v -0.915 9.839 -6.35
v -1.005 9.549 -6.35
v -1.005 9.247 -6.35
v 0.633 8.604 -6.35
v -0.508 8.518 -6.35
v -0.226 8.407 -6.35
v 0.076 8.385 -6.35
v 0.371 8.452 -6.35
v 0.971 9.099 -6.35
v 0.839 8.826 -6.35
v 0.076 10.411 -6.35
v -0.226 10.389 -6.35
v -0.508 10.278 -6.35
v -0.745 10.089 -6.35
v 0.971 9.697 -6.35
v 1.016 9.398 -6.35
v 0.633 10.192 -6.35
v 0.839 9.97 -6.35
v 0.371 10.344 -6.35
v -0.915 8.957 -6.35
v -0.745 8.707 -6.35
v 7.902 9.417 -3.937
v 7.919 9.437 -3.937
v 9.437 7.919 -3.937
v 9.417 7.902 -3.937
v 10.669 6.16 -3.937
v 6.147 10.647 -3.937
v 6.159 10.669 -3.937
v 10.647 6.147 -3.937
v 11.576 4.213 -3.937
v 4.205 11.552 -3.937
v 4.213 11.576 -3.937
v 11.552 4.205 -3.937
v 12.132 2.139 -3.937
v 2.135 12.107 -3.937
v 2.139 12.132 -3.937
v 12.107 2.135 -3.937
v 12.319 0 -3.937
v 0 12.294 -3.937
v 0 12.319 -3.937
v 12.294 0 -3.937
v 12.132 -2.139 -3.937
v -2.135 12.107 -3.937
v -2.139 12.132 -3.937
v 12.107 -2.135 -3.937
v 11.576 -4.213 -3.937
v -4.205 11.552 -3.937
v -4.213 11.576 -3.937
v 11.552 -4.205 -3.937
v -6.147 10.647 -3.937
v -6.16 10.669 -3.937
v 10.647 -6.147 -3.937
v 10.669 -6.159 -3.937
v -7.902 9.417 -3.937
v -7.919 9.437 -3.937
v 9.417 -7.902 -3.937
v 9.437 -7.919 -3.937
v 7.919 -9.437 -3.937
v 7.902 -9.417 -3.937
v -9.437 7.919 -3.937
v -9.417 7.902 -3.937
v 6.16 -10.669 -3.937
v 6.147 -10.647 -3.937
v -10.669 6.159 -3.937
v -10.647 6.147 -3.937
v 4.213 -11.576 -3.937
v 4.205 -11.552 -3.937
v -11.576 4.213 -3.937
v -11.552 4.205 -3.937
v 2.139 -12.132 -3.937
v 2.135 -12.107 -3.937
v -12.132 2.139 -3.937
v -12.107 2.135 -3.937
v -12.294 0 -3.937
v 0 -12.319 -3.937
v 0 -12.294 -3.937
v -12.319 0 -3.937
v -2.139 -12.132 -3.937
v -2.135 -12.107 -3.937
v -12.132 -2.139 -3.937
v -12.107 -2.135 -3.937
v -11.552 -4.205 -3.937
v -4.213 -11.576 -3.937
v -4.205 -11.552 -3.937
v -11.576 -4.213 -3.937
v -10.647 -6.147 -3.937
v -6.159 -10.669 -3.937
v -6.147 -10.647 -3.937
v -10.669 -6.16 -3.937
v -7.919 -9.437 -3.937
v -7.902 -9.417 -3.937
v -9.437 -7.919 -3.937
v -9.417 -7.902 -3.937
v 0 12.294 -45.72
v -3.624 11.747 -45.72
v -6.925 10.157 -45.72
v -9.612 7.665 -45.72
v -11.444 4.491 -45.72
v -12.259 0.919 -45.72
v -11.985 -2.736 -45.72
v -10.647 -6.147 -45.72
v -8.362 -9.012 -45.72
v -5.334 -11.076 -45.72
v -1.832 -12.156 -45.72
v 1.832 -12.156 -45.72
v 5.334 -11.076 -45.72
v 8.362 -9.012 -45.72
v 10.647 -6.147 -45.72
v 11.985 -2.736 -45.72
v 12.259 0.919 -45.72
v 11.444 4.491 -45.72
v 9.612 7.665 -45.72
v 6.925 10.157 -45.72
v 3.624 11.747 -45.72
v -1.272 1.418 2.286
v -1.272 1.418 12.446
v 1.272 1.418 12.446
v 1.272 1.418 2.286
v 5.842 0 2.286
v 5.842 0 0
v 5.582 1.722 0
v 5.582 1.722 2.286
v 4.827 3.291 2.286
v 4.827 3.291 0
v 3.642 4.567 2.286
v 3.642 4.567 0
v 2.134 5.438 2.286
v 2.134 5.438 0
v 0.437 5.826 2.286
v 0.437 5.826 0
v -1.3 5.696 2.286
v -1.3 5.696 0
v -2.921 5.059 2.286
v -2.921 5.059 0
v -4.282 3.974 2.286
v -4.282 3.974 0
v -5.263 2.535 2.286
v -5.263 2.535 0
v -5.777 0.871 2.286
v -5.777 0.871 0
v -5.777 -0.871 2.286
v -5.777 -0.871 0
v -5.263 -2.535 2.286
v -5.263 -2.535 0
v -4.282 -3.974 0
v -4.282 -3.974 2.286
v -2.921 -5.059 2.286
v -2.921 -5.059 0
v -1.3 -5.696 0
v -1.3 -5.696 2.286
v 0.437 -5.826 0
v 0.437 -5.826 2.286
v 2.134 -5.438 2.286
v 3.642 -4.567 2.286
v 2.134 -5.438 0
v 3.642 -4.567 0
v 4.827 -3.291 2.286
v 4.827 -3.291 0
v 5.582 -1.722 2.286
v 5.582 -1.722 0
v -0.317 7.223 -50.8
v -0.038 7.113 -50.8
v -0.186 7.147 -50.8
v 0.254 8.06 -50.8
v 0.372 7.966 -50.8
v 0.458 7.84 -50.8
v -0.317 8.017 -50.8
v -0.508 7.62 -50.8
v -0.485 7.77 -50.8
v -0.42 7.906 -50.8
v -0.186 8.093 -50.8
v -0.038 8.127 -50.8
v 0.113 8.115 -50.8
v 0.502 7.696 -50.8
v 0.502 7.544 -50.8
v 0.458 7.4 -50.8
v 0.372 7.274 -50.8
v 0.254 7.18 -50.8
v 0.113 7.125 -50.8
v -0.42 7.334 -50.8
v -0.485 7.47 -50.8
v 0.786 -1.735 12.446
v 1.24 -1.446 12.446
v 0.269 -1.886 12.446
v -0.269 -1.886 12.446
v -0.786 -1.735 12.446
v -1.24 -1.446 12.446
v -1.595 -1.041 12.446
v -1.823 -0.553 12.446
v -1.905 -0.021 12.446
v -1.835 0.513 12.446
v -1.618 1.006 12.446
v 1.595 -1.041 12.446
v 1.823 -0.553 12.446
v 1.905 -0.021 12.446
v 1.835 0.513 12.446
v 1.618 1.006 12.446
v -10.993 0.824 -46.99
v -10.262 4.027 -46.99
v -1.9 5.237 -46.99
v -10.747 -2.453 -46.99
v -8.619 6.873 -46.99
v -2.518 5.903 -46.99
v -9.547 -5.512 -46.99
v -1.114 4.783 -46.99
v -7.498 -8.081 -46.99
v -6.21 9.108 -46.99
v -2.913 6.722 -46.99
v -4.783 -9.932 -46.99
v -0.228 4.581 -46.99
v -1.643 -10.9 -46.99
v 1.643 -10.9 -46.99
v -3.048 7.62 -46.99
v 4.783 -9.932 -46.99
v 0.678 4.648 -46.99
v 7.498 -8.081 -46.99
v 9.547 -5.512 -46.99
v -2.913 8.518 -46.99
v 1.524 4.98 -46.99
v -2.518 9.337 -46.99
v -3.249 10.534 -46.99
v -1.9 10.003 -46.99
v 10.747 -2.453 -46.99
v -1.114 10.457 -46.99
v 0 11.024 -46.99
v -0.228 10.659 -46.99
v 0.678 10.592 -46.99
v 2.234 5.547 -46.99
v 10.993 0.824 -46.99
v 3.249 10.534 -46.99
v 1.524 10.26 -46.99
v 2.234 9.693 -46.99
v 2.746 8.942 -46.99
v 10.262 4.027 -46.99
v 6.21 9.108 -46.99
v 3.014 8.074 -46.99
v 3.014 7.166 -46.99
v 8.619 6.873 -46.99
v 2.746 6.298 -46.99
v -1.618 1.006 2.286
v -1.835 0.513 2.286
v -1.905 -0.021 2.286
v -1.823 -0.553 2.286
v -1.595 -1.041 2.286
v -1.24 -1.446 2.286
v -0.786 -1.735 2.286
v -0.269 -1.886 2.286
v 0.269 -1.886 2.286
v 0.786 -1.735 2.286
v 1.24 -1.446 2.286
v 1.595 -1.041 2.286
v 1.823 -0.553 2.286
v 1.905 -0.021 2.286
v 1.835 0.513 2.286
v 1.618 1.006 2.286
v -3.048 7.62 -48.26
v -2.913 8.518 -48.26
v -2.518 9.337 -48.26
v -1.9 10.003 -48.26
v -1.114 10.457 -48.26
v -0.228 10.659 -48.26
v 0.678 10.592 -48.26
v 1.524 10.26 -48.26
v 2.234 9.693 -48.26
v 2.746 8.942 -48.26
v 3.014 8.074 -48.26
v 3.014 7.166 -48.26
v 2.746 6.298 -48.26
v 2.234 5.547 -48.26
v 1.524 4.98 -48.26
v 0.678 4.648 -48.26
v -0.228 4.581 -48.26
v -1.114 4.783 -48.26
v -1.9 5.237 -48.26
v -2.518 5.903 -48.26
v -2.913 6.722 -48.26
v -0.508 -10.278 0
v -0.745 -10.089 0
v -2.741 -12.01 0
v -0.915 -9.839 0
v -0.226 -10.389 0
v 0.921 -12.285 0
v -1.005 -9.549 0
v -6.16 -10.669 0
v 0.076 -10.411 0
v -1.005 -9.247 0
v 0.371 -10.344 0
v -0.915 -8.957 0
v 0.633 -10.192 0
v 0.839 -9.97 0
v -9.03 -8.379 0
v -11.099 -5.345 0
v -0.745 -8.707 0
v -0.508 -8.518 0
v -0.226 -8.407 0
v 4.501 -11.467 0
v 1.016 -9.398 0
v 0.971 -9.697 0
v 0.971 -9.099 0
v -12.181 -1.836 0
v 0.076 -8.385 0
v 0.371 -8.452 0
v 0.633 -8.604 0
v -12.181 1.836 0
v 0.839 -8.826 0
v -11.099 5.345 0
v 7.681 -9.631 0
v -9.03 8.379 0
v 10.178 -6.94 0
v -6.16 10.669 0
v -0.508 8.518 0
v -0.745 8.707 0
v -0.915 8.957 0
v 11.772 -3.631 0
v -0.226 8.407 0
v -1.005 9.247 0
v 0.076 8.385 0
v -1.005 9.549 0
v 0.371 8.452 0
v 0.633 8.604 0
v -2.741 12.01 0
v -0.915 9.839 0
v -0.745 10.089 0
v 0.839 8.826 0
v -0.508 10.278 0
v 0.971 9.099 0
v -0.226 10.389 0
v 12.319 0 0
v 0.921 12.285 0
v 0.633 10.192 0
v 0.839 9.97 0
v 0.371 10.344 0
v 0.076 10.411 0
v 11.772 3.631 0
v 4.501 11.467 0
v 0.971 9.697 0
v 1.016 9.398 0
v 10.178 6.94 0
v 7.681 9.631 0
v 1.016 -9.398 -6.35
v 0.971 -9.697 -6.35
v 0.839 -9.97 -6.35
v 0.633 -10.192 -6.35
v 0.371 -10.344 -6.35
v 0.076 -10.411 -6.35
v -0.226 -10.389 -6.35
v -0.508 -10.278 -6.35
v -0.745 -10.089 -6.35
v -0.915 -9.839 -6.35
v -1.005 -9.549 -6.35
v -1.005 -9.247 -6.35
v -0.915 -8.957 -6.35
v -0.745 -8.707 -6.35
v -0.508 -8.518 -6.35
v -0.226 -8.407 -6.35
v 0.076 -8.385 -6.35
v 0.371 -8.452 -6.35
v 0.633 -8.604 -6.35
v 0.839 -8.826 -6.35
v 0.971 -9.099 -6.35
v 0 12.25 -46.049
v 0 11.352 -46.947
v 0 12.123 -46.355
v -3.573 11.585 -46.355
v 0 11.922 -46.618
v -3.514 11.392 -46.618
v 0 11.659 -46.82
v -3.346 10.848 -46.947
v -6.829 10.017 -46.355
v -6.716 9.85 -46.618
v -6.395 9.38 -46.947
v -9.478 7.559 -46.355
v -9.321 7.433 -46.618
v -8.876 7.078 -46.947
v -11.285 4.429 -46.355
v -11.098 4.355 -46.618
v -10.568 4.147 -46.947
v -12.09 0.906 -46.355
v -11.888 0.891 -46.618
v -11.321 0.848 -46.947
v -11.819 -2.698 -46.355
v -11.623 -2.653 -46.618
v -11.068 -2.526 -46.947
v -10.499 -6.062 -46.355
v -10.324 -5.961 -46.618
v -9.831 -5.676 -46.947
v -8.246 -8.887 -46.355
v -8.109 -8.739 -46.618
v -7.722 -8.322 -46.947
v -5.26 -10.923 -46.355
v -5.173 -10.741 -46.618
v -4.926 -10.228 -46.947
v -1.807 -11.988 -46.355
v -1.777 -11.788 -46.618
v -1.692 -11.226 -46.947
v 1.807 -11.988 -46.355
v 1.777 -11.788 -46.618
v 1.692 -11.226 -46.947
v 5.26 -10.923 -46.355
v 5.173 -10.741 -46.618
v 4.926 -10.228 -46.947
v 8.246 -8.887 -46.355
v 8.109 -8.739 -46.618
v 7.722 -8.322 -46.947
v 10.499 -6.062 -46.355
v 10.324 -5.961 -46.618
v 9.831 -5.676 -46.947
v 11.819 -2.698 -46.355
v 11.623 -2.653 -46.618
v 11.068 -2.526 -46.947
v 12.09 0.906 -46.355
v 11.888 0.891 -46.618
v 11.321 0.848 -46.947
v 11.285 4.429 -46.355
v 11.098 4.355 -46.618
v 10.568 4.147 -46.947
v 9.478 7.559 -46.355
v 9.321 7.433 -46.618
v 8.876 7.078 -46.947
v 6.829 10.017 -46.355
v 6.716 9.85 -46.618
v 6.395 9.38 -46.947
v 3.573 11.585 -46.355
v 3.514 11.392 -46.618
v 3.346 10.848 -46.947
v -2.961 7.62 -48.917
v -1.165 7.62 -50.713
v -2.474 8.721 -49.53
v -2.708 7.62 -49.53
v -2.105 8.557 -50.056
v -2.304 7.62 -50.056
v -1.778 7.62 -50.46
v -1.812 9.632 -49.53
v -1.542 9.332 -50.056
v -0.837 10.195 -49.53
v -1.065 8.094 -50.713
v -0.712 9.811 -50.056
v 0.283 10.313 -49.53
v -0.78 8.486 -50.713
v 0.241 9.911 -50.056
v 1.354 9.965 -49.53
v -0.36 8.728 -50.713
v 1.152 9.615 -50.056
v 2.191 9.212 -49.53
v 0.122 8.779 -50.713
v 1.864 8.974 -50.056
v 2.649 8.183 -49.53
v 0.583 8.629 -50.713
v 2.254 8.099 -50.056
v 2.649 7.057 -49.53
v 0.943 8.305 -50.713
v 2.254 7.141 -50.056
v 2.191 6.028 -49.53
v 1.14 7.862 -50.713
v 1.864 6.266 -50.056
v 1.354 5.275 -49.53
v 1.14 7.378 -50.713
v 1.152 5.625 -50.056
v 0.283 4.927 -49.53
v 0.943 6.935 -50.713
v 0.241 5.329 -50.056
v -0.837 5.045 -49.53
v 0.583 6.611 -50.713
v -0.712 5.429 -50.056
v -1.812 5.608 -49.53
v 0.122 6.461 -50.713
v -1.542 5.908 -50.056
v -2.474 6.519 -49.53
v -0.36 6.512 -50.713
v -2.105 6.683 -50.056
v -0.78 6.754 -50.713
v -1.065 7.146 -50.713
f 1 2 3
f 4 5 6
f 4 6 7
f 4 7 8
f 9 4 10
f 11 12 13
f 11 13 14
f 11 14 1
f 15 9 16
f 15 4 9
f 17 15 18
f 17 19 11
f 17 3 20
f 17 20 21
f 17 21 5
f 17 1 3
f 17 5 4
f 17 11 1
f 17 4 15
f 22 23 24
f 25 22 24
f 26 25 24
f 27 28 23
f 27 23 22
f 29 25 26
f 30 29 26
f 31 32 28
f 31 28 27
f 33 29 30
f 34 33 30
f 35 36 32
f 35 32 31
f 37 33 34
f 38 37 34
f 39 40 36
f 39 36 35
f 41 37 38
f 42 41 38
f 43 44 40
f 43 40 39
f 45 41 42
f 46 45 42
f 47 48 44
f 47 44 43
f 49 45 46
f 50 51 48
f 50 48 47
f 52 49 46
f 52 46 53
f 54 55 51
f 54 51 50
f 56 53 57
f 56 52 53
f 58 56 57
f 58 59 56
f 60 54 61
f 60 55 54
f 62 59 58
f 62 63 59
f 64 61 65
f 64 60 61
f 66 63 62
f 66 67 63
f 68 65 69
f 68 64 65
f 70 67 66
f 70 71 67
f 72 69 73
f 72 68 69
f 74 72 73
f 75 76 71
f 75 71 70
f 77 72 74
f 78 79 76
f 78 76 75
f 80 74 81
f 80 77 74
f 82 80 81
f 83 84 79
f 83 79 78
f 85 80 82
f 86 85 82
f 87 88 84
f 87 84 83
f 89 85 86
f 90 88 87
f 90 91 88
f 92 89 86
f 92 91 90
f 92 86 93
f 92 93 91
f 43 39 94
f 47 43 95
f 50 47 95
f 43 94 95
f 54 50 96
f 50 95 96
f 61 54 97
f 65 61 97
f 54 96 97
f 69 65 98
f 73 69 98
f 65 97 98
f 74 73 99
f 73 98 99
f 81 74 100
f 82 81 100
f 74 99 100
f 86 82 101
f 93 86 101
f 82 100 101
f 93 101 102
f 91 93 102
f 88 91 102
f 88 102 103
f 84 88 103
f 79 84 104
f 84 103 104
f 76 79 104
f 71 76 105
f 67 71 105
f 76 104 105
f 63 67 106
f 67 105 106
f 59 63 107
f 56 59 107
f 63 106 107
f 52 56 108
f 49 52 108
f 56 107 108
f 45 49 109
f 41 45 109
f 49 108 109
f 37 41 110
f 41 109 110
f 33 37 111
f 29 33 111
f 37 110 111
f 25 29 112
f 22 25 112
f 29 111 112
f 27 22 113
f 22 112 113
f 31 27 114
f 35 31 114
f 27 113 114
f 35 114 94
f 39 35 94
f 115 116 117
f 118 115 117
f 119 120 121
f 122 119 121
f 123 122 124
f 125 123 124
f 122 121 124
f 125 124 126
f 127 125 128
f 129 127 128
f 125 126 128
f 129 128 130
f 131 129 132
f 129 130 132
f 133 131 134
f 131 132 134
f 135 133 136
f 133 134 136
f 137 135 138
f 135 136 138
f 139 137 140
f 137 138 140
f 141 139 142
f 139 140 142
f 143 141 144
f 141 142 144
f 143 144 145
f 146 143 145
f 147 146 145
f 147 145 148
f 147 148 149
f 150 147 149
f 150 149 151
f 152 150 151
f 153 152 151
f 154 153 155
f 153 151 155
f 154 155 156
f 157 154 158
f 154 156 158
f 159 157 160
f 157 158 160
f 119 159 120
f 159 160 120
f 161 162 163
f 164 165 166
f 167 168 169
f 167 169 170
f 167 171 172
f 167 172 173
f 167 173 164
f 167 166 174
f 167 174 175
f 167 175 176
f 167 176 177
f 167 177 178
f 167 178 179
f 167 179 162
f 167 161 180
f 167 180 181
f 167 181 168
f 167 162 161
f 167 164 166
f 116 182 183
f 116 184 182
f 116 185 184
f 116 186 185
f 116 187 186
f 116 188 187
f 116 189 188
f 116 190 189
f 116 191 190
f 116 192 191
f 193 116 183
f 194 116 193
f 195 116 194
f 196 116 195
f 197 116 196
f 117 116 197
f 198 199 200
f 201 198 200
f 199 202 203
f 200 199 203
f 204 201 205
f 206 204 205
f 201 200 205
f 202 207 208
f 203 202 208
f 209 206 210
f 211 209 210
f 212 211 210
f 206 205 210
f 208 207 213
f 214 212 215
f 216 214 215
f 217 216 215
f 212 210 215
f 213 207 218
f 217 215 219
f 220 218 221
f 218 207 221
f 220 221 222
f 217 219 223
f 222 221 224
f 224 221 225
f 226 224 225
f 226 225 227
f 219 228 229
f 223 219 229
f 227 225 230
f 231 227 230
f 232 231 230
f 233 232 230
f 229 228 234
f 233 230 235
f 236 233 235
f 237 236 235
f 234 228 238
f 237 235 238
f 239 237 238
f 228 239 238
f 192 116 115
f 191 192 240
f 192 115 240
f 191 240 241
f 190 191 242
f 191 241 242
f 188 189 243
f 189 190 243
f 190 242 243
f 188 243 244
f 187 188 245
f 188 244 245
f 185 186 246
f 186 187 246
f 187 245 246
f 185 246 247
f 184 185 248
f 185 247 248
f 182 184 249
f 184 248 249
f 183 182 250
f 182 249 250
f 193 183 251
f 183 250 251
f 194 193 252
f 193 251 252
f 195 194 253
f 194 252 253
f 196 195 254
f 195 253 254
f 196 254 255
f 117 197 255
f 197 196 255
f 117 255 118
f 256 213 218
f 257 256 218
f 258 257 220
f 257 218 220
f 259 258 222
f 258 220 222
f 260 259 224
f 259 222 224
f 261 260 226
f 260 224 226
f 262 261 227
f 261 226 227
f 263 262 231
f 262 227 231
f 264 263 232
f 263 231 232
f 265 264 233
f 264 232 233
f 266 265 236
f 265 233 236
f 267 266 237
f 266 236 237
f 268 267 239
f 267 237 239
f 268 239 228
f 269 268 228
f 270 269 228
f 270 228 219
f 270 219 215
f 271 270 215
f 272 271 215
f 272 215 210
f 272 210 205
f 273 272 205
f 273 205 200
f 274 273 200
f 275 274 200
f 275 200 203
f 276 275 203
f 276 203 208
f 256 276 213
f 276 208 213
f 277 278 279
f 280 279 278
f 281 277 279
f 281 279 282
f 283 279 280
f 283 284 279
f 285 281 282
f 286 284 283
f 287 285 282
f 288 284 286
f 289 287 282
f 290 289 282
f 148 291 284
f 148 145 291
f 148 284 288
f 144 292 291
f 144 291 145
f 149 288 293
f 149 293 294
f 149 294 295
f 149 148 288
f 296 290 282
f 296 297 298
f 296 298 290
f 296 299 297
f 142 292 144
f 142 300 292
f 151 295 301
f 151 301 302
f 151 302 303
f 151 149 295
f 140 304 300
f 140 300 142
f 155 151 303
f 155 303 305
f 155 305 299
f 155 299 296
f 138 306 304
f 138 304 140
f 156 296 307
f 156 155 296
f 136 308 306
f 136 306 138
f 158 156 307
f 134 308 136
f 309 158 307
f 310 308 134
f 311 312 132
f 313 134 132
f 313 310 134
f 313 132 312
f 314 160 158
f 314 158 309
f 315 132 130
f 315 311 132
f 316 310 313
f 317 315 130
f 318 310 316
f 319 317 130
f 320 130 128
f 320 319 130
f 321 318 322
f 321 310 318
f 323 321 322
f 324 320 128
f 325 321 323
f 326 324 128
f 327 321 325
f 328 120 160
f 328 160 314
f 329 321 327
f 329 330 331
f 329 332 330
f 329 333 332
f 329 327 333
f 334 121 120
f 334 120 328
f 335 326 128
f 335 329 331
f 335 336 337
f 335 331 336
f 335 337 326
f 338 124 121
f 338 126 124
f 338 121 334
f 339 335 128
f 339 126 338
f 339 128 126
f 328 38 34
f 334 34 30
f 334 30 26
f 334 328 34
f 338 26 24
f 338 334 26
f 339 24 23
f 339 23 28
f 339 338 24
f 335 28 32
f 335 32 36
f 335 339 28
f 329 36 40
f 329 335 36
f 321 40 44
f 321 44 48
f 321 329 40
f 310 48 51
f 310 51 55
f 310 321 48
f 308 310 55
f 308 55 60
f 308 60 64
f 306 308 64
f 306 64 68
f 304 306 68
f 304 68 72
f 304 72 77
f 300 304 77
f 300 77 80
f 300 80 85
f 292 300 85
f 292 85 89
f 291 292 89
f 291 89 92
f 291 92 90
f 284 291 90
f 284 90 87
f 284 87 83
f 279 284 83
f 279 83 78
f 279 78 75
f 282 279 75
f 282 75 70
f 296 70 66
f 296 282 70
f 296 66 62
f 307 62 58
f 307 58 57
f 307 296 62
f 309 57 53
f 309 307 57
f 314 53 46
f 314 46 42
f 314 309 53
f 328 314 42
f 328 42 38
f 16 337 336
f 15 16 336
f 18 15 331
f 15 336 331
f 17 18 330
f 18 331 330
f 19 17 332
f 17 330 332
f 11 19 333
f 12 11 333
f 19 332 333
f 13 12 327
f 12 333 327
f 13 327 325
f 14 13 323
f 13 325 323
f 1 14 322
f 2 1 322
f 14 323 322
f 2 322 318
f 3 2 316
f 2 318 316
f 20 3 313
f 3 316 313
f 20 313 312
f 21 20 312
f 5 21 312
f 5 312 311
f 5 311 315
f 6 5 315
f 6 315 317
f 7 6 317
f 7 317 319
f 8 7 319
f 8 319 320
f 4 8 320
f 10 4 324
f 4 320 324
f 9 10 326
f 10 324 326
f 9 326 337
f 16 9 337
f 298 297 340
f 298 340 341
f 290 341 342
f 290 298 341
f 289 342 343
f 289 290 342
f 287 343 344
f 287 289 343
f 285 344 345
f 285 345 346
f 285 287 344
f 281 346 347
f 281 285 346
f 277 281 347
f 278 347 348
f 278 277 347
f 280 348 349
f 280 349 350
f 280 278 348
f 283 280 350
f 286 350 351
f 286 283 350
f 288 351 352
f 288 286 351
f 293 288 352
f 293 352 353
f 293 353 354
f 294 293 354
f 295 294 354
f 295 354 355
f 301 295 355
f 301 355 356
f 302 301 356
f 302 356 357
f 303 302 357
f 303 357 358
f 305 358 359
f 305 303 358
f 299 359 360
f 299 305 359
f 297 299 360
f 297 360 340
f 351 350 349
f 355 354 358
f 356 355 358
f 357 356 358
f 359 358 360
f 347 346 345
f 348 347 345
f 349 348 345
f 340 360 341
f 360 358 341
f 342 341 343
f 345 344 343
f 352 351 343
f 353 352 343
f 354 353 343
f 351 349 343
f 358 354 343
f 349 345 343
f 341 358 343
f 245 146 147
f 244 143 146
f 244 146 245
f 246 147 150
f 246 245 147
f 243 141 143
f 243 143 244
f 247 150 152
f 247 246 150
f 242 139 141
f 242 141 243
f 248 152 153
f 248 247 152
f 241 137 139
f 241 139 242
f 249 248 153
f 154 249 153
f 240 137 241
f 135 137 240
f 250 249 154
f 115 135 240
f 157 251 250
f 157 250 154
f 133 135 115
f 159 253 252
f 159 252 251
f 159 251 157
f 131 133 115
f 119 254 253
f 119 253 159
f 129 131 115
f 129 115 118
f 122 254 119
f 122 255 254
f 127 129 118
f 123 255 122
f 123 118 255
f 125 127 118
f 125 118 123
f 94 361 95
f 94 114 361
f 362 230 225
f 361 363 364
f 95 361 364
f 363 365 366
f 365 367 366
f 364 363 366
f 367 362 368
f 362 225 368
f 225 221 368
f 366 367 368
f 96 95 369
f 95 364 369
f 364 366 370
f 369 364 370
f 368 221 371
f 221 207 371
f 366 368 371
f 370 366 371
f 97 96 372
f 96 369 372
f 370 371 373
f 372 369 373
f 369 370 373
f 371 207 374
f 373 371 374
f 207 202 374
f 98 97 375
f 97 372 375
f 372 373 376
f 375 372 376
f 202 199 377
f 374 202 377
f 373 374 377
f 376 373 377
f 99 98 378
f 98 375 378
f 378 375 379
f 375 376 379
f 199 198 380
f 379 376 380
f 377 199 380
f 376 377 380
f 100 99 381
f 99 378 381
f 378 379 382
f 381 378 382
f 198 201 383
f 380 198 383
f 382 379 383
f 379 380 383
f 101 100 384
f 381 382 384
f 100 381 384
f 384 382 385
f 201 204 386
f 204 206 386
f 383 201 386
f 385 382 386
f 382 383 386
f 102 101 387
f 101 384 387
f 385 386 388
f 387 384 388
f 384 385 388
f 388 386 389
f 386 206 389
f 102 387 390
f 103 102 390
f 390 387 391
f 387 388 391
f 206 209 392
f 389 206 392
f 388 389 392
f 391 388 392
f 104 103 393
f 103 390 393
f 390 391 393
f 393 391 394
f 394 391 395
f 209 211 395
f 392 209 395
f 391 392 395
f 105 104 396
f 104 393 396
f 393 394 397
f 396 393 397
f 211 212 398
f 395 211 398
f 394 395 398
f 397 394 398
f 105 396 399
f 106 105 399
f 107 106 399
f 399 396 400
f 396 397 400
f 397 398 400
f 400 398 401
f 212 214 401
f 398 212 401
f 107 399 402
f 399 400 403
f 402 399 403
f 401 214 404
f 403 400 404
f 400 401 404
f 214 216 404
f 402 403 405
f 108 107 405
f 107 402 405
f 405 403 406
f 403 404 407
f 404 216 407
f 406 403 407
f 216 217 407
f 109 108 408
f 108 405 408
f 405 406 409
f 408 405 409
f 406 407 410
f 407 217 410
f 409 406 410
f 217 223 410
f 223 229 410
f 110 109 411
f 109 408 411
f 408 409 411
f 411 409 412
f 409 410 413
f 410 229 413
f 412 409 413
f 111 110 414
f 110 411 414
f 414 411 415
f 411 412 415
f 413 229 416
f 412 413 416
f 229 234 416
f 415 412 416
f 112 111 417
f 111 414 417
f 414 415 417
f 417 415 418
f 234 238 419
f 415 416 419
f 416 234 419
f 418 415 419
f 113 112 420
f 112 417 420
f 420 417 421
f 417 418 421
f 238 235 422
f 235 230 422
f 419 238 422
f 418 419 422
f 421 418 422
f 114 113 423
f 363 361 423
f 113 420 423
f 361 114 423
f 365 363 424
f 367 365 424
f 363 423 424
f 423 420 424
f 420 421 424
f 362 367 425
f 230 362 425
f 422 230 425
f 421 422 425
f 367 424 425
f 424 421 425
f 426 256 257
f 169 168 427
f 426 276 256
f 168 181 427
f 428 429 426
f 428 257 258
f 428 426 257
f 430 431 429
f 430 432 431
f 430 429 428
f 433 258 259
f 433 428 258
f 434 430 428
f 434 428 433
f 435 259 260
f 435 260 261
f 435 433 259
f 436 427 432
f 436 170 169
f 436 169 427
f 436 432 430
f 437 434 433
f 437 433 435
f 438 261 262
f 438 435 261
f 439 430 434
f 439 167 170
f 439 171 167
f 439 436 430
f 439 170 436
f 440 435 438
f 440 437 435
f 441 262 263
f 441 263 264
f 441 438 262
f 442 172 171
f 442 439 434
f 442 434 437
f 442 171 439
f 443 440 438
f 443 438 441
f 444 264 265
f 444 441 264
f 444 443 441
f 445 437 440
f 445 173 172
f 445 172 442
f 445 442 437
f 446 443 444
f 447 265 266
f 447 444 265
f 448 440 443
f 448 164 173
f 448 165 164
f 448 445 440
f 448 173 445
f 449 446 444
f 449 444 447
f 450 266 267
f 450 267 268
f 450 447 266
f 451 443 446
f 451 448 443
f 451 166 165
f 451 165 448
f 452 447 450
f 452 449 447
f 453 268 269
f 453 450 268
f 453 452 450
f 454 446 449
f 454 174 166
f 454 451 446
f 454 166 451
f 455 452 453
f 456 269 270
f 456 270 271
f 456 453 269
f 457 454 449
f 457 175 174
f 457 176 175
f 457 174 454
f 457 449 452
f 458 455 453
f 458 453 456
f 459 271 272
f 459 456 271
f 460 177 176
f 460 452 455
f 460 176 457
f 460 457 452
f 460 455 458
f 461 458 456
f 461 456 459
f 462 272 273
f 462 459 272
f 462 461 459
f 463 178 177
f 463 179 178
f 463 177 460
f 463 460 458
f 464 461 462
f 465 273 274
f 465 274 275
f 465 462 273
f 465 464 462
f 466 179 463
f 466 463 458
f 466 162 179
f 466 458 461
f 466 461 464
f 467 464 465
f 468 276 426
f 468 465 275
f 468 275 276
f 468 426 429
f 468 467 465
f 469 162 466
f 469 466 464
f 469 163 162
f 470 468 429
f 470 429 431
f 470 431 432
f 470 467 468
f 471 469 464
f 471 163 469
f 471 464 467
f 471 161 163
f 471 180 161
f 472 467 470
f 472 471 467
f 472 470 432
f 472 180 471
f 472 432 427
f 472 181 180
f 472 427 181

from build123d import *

# Parameters (mm, degrees)
SKETCH1_R           = 12.319
BOSS_EXTRUDE1_DEPTH = 46.99
SKETCH2_R           = 5.842
BOSS_EXTRUDE2_DEPTH = 2.286
SKETCH3_R           = 1.905
BOSS_EXTRUDE3_DEPTH = 10.16
SKETCH4_W           = 43.053
SKETCH4_H           = 0.0254
FILLET1_R           = 1.27
SKETCH5_R           = 3.048
BOSS_EXTRUDE4_DEPTH = 3.81
FILLET2_R           = 2.54
SKETCH6_R           = 1.016
CUT_EXTRUDE1_DEPTH  = 6.35
SKETCH7_W           = 2.991253898
SKETCH7_H           = 0.508
CUT_EXTRUDE2_DEPTH  = 10.16


with BuildPart() as part:
    # Sketch1 → Boss-Extrude1 (new body)
    with BuildSketch(Plane.XY):
        Circle(SKETCH1_R)
    extrude(amount=-BOSS_EXTRUDE1_DEPTH)

    # Sketch2 → Boss-Extrude2 (add)
    with BuildSketch(Plane.XY):
        Circle(SKETCH2_R)
    extrude(amount=BOSS_EXTRUDE2_DEPTH)

    # Sketch3 → Boss-Extrude3 (add)
    with BuildSketch(Plane.XY.offset(2.286)):
        Circle(SKETCH3_R)
    extrude(amount=BOSS_EXTRUDE3_DEPTH)

    # Sketch4 → Cut-Revolve1 (revolve, cut)
    with BuildSketch(Plane(origin=(0, 0, 0), x_dir=(0, 0, -1), z_dir=(1, 0, 0))):
        with Locations((25.4635, 12.3063)):
            Rectangle(SKETCH4_W, SKETCH4_H)
    revolve(axis=Axis((0, 0, -46.99), (0, 0, 1)), mode=Mode.SUBTRACT)

    # Fillet1
    fillet1_edges = [part.edges().sort_by_distance(p)[0] for p in [
        (0, -12.2936, -46.99),
    ]]
    fillet(fillet1_edges, radius=FILLET1_R)

    # Sketch5 → Boss-Extrude4 (add)
    with BuildSketch(Plane(origin=(0, 0, -46.99), x_dir=(-1, 0, 0), z_dir=(0, 0, -1))):
        with Locations((0, 7.62)):
            Circle(SKETCH5_R)
    extrude(amount=BOSS_EXTRUDE4_DEPTH)

    # Fillet2
    fillet2_edges = [part.edges().sort_by_distance(p)[0] for p in [
        (3.048, 7.62, -50.8),
    ]]
    fillet(fillet2_edges, radius=FILLET2_R)

    # Sketch6 → Cut-Extrude1 (cut)
    with BuildSketch(Plane.XY):
        with Locations((0, 9.398)):
            Circle(SKETCH6_R)
    cut_extrude1 = extrude(amount=-CUT_EXTRUDE1_DEPTH, mode=Mode.SUBTRACT)

    # Mirror1: Cut-Extrude1 across plane
    add(cut_extrude1.mirror(Plane.ZX), mode=Mode.SUBTRACT)

    # Sketch7 → Cut-Extrude2 (cut)
    with BuildSketch(Plane.XY.offset(12.446)):
        with Locations((0, 1.672065055)):
            Rectangle(SKETCH7_W, SKETCH7_H)
    extrude(amount=-CUT_EXTRUDE2_DEPTH, mode=Mode.SUBTRACT)


solid = part.part
